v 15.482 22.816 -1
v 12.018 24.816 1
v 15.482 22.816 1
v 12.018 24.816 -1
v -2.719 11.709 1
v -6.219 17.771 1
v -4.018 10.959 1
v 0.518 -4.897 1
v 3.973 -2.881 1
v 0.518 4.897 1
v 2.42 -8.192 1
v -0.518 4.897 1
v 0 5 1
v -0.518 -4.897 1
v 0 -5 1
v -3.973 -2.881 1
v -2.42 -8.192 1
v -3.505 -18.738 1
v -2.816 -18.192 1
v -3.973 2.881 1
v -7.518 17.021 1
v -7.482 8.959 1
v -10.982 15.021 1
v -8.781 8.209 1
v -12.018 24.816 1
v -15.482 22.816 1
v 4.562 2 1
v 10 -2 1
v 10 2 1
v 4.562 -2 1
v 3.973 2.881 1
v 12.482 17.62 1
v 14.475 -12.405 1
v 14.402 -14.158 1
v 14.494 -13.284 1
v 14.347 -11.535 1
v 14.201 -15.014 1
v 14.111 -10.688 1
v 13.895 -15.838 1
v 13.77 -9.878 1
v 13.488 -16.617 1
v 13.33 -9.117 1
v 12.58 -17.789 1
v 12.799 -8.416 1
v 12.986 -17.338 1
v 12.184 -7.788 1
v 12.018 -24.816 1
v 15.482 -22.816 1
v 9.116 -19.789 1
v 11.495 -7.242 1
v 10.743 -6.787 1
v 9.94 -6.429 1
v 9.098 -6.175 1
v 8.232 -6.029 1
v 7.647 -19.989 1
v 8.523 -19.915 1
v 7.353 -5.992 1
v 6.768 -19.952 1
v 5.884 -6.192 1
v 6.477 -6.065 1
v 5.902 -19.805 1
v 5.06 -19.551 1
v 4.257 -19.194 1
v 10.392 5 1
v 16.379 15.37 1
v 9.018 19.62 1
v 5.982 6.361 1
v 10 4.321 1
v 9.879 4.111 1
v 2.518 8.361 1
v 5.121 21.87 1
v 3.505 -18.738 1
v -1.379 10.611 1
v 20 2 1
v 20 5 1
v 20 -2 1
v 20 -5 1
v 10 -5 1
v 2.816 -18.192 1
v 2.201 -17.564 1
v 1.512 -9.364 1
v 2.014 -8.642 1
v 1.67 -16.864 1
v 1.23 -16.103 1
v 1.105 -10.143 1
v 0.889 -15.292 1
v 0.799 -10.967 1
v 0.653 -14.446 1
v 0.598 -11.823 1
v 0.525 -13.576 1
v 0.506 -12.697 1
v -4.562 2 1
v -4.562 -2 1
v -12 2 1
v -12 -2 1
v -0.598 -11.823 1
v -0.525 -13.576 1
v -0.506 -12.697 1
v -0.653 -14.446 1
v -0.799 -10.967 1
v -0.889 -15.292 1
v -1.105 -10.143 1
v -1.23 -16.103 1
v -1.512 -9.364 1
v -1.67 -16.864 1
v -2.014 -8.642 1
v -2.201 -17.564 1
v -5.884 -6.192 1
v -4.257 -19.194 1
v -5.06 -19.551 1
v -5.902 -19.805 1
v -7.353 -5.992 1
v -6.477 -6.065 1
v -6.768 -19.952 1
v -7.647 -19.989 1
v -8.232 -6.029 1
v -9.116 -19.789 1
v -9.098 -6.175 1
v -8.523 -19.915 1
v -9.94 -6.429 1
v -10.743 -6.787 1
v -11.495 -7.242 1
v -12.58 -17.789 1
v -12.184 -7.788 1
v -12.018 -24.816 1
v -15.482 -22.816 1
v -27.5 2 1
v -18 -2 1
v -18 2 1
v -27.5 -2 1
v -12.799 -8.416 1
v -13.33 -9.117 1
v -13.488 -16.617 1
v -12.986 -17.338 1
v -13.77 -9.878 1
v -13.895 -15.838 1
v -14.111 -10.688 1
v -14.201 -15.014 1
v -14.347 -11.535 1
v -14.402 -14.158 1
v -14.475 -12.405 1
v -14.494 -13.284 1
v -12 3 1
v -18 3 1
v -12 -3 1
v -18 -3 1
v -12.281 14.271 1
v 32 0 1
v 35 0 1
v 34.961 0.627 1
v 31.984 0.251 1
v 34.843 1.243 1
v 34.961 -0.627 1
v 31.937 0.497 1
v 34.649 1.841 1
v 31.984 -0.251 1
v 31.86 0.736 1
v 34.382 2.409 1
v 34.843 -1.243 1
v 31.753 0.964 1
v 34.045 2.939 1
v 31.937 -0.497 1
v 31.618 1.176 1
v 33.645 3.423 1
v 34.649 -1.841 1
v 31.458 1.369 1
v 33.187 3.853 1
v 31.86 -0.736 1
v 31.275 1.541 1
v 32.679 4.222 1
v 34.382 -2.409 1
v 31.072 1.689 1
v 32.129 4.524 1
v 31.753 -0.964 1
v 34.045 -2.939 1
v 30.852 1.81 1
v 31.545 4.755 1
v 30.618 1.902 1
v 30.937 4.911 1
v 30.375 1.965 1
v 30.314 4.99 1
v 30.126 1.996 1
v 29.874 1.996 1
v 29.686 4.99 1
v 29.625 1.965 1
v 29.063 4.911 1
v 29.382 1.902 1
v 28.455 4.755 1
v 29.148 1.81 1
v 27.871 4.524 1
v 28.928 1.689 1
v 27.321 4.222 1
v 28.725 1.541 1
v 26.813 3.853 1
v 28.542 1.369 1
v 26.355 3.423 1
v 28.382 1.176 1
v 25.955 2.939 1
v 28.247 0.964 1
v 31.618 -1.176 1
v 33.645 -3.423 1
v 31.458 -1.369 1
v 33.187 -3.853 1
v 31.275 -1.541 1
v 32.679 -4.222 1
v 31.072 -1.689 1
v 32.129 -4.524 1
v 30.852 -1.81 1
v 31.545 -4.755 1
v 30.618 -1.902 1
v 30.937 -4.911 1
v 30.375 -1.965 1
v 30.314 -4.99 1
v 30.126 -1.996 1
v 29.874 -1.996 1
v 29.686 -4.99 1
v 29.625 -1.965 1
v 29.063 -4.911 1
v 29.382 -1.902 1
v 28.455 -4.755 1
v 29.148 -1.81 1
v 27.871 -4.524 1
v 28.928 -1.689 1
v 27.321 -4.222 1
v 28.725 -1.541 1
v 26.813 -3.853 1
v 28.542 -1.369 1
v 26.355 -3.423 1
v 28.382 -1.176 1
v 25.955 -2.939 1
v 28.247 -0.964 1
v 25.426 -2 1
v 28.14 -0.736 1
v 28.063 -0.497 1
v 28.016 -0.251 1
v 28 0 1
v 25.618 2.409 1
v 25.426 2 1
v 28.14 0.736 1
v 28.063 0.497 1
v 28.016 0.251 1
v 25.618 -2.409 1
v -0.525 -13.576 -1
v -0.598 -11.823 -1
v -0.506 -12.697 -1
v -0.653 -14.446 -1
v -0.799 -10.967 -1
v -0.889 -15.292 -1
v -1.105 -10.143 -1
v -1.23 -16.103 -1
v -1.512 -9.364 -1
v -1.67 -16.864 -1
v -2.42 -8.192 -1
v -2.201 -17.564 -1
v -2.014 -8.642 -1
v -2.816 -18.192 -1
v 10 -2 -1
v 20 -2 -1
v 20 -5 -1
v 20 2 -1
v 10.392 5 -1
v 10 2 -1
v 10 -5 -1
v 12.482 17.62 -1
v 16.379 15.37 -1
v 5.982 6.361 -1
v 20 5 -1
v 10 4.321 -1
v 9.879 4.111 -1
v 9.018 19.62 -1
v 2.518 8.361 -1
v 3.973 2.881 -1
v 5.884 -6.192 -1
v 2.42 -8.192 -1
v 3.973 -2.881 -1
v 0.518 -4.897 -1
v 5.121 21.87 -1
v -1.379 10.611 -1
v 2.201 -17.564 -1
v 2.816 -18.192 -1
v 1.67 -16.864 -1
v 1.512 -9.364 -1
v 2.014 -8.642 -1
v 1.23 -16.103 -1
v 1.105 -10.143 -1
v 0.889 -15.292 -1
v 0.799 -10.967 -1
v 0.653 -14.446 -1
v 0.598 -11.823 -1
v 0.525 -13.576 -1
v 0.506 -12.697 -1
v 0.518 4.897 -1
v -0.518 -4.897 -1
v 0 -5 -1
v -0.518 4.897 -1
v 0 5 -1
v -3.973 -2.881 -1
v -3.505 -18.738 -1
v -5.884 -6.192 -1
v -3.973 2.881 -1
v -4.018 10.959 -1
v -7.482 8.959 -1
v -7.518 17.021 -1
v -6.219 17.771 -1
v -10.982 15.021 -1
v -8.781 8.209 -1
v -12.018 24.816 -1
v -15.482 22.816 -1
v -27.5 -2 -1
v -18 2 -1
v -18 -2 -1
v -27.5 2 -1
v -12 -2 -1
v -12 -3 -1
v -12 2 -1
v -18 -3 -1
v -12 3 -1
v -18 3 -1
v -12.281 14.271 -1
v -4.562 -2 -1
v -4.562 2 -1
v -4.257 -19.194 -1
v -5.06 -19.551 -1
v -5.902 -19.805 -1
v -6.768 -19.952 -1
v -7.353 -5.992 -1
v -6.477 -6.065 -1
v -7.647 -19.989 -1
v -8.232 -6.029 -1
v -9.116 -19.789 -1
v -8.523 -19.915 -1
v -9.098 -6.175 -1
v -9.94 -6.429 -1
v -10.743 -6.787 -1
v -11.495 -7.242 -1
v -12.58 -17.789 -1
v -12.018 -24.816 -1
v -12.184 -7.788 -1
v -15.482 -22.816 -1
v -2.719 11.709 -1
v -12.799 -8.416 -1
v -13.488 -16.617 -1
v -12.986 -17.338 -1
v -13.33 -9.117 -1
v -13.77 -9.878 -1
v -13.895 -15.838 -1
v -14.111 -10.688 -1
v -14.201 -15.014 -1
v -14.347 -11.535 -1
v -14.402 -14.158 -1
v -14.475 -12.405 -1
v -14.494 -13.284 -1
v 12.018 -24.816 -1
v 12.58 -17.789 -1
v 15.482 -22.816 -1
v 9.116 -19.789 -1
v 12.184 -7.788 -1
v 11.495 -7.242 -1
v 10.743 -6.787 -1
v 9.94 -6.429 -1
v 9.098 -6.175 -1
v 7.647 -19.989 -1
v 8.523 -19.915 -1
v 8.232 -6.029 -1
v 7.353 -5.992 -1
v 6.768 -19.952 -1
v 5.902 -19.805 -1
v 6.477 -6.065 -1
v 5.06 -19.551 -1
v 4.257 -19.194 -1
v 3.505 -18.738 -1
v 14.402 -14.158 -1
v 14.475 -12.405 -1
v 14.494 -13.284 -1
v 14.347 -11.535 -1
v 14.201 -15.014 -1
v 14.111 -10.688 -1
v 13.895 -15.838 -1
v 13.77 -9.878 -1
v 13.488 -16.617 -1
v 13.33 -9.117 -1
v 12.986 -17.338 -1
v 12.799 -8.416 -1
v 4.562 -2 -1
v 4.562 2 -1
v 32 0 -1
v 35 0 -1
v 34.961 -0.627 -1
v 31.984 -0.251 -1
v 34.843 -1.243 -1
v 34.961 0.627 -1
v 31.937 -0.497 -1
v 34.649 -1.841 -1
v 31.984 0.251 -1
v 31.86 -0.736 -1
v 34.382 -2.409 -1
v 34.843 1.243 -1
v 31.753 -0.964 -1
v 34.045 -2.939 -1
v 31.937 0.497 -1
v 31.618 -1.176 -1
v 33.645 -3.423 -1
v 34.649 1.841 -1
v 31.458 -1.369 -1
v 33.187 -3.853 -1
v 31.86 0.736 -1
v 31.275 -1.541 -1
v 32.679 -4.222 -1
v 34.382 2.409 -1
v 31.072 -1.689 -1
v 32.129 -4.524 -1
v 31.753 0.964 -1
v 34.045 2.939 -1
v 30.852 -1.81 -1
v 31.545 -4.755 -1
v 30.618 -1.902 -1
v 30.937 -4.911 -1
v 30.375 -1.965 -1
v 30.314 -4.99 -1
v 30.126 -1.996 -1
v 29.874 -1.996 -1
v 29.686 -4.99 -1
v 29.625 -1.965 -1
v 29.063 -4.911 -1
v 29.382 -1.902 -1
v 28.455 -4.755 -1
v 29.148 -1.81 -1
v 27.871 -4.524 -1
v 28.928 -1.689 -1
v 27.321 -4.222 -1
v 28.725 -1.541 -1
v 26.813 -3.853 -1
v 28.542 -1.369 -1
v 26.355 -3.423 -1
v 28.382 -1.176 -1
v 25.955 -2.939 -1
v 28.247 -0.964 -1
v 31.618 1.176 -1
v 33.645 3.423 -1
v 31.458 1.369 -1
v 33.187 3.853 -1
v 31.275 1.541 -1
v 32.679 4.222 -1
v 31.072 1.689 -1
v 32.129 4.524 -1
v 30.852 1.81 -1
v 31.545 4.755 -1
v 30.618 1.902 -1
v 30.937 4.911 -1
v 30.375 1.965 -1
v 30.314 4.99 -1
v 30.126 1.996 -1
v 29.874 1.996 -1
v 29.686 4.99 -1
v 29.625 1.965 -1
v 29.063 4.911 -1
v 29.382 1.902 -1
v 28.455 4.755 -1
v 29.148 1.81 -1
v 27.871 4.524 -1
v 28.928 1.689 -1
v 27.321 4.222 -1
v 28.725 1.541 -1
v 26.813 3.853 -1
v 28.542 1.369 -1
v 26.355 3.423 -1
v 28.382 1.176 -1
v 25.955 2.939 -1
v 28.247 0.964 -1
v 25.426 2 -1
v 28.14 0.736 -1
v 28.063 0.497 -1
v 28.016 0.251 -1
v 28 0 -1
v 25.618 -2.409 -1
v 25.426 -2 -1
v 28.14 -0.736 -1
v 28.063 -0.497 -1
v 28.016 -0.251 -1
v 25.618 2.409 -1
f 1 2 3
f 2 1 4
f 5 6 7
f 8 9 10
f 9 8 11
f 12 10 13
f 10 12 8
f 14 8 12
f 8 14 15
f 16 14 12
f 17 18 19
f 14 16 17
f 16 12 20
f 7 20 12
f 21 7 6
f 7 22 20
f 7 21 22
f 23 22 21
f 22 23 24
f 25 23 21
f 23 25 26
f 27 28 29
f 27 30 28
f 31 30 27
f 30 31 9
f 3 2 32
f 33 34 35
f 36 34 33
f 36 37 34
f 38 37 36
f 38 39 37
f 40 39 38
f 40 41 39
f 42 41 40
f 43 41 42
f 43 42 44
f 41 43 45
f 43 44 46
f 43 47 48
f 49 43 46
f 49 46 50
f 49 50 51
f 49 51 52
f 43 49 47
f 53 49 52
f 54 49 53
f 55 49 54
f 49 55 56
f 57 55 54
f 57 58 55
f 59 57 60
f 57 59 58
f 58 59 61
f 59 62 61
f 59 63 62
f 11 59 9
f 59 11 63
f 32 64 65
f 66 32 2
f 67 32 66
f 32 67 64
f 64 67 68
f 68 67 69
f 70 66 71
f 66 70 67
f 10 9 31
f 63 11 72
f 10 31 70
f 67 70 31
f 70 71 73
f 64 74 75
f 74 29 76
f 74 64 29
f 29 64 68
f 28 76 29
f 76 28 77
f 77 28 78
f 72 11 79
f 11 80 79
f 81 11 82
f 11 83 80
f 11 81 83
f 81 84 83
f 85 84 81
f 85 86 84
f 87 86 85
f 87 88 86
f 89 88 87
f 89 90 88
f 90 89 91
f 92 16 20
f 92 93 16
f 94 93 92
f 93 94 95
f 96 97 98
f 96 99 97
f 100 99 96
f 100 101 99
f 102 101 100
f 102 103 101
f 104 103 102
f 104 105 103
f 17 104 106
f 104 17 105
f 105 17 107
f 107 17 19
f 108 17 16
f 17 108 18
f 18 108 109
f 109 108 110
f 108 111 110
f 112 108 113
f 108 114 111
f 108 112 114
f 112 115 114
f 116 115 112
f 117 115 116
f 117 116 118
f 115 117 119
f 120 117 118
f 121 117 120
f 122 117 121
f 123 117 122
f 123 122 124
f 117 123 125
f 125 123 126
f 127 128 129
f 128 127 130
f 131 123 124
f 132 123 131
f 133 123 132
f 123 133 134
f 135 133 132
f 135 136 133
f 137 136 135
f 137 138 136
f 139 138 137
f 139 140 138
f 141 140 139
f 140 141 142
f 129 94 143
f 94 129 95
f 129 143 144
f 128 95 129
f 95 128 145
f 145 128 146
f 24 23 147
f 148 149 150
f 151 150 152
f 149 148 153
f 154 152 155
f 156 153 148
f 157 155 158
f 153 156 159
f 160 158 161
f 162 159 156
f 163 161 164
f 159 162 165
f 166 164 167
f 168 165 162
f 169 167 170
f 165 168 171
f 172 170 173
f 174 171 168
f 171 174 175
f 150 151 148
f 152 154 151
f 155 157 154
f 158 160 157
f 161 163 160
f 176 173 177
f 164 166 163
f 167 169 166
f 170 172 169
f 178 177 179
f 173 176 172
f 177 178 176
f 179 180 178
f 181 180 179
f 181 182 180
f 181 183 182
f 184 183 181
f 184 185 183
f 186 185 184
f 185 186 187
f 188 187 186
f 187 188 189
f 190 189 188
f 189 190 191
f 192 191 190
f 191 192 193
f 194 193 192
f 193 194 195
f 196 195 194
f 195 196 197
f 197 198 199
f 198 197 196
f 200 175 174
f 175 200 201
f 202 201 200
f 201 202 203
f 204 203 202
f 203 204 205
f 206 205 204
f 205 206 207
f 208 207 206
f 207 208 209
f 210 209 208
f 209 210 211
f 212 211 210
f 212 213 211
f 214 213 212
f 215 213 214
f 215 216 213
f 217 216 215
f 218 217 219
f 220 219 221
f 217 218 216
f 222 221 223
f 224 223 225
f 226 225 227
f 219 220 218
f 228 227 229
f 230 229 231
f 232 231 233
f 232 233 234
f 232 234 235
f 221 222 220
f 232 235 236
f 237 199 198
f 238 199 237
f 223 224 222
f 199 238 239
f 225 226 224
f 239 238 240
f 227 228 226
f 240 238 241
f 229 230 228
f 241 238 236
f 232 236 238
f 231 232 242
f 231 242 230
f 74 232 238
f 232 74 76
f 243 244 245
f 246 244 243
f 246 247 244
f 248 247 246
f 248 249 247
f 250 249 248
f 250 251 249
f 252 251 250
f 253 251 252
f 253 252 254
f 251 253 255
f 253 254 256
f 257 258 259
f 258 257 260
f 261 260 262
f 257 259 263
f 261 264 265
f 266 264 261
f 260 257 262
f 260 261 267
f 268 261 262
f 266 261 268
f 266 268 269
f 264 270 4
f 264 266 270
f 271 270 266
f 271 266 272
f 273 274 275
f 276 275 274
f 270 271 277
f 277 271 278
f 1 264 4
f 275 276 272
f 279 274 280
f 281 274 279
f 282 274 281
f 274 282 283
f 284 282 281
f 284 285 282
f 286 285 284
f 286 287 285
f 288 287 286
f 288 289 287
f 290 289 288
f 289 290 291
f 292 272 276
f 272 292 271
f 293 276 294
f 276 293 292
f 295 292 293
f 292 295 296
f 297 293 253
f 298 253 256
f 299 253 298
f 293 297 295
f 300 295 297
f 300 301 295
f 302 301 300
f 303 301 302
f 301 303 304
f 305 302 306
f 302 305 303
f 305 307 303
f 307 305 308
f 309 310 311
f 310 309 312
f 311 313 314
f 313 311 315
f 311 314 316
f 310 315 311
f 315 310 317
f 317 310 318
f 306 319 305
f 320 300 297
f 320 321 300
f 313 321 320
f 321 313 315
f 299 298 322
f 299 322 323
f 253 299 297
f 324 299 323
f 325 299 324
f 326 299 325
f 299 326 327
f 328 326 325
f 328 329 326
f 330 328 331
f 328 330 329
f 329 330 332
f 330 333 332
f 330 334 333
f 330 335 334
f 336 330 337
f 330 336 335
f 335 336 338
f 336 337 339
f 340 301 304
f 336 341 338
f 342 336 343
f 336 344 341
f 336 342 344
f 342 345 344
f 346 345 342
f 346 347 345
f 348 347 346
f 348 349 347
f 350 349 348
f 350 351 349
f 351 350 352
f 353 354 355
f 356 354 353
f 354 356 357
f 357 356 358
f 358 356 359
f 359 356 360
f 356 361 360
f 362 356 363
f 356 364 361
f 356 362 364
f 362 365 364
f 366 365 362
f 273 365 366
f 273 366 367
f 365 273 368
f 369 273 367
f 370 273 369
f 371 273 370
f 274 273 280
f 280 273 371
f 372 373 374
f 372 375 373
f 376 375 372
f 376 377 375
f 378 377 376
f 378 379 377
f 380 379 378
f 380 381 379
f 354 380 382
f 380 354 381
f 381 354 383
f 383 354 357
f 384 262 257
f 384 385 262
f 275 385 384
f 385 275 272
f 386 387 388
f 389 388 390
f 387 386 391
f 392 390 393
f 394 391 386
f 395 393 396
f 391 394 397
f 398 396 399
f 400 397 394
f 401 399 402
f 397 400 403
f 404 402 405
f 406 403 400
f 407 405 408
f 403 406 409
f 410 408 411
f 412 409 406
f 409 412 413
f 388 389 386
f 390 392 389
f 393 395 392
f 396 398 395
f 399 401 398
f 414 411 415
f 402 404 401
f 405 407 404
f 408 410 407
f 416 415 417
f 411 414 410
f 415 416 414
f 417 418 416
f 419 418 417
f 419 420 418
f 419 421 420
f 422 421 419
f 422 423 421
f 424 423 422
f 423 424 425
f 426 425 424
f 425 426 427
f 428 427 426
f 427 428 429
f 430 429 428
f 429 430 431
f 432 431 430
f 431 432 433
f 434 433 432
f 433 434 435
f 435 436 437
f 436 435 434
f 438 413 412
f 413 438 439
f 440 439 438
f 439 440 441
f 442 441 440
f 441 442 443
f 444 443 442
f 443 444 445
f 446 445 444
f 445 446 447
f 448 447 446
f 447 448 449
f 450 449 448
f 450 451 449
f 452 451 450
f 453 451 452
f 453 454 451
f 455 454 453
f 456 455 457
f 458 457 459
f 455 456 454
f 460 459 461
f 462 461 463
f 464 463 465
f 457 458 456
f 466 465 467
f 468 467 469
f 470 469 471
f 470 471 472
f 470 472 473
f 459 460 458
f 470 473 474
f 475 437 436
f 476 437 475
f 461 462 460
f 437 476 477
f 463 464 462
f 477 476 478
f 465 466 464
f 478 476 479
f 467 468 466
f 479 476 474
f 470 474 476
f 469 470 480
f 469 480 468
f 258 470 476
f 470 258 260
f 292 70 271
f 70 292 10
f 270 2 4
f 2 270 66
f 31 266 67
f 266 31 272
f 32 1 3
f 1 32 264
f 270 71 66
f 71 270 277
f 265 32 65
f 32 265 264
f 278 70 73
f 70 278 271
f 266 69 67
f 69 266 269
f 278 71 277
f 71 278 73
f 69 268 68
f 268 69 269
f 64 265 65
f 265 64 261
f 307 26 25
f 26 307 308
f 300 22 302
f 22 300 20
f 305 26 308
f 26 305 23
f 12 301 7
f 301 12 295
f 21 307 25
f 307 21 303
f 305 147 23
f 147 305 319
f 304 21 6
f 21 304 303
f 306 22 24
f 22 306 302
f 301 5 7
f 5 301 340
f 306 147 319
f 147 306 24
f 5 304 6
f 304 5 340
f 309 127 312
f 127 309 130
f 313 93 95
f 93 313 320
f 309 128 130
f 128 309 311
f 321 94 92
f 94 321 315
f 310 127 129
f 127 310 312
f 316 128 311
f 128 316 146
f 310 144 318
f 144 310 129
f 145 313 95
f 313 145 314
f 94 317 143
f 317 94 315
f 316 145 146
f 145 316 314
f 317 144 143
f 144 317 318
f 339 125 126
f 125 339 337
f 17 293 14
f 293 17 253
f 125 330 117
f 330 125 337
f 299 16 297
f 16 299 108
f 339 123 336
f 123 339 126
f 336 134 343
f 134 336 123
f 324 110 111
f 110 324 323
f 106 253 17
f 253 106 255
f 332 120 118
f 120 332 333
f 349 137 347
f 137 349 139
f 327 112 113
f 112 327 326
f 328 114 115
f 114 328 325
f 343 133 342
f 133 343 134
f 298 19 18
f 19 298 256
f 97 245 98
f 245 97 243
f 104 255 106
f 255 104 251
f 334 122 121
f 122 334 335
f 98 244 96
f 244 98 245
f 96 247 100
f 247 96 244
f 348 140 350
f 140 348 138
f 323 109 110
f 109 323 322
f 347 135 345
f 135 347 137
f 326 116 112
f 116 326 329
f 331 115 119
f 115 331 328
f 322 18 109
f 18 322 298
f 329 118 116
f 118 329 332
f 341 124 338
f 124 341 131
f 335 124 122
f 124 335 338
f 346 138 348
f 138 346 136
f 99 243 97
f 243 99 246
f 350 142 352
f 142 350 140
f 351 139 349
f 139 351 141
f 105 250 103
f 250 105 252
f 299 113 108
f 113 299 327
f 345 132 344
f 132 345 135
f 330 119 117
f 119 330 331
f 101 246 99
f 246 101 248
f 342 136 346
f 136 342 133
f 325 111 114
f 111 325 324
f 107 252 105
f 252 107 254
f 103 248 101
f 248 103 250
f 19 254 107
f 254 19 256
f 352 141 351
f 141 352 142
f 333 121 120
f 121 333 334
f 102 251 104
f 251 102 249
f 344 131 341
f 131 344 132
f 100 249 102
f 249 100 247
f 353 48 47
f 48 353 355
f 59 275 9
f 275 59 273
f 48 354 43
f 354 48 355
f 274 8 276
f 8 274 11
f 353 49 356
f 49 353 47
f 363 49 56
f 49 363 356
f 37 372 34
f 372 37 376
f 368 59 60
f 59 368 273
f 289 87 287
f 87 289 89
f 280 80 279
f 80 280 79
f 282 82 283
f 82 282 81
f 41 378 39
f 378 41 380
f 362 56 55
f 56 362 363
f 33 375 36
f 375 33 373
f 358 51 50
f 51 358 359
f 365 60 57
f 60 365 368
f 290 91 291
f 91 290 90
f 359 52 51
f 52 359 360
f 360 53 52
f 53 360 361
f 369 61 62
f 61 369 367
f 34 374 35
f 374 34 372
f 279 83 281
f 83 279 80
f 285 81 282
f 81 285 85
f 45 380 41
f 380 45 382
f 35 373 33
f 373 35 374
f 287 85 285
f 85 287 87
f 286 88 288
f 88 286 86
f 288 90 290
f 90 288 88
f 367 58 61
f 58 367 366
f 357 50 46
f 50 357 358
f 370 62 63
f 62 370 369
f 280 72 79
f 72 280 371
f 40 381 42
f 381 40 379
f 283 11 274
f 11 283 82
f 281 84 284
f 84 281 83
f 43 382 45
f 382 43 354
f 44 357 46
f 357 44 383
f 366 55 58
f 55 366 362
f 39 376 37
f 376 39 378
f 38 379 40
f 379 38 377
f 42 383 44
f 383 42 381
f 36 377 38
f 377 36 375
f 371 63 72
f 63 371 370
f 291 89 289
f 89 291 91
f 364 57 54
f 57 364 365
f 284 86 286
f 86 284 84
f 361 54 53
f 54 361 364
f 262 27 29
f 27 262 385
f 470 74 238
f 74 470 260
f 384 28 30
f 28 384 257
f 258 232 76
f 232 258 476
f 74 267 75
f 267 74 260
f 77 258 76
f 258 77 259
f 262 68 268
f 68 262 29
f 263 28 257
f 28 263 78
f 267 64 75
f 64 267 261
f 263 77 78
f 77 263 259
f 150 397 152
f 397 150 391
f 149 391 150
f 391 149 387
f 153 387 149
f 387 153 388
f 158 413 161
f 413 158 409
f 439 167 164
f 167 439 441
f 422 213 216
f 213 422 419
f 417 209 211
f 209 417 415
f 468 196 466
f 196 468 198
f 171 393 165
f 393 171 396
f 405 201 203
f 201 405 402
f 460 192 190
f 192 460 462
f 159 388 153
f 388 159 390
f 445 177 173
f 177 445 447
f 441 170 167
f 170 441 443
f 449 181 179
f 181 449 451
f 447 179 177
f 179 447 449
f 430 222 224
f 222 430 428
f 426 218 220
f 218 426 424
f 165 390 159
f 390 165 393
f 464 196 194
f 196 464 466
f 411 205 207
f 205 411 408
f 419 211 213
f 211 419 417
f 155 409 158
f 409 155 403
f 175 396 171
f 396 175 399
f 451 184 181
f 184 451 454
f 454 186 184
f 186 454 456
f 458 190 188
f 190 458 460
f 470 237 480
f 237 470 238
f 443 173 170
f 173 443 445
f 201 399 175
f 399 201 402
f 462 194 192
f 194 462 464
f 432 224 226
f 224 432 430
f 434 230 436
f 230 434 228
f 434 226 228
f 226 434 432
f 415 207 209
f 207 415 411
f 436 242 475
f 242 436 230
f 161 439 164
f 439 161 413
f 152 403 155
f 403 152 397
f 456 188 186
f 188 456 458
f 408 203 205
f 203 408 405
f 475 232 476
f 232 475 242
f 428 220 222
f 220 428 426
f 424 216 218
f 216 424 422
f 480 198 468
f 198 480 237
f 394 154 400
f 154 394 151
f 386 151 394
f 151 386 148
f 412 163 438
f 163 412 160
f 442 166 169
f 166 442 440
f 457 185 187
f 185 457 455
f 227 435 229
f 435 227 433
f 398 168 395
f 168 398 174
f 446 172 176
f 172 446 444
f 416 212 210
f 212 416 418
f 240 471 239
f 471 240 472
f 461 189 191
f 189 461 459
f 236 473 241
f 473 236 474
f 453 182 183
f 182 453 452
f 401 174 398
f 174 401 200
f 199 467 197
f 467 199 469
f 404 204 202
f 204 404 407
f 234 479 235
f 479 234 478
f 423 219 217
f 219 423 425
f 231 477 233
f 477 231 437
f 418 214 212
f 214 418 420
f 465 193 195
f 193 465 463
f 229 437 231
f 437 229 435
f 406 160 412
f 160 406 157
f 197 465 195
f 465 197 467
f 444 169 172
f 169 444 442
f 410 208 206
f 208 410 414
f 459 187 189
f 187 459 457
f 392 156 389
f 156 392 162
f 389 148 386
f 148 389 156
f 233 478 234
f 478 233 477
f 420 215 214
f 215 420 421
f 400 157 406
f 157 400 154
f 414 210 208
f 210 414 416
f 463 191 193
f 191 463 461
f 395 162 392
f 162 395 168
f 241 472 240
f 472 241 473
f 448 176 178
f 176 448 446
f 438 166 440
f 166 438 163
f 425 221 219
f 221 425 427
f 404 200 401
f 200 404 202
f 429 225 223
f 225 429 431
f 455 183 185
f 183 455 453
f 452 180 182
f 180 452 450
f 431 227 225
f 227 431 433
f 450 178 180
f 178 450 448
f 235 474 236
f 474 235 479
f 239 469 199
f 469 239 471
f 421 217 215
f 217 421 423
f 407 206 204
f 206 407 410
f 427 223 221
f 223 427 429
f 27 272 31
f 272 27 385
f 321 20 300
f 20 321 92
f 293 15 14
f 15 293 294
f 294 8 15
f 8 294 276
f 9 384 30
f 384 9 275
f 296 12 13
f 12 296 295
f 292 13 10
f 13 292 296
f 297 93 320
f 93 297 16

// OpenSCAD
Amount = 1;

module makeSnowflake() {
  armWidth = round(rands(2,5,1)[0]);
  union(){
    cylinder(r1=5, r2=5, h=2, center=true);
    for (j = [1 : abs(1) : 6]) {
      rotate([0, 0, (60 * j)]){
        translate([15, 0, 0]){
          union(){
            dotSize = round(rands(armWidth + 2,armWidth + 10,1)[0]);
            cube([25, armWidth, 2], center=true);
            translate([0, 0, 0]){
              if (0 == round(rands(0,1,1)[0])) {
                cube([dotSize, dotSize, 2], center=true);
              } else {
                cylinder(r1=(dotSize / 2), r2=(dotSize / 2), h=2, center=true, $fn=50);
              }

            }
          }
        }
      }
    }

    translate([30, 0, 0]){
      difference() {
        cylinder(r1=5, r2=5, h=2, center=true, $fn=50);

        cylinder(r1=2, r2=2, h=4, center=true, $fn=50);
      }
    }
  }
}

for (i = [0 : abs(1) : Amount - 1]) {
  translate([(i * 60), 0, 0]){
    makeSnowflake();
  }
}
